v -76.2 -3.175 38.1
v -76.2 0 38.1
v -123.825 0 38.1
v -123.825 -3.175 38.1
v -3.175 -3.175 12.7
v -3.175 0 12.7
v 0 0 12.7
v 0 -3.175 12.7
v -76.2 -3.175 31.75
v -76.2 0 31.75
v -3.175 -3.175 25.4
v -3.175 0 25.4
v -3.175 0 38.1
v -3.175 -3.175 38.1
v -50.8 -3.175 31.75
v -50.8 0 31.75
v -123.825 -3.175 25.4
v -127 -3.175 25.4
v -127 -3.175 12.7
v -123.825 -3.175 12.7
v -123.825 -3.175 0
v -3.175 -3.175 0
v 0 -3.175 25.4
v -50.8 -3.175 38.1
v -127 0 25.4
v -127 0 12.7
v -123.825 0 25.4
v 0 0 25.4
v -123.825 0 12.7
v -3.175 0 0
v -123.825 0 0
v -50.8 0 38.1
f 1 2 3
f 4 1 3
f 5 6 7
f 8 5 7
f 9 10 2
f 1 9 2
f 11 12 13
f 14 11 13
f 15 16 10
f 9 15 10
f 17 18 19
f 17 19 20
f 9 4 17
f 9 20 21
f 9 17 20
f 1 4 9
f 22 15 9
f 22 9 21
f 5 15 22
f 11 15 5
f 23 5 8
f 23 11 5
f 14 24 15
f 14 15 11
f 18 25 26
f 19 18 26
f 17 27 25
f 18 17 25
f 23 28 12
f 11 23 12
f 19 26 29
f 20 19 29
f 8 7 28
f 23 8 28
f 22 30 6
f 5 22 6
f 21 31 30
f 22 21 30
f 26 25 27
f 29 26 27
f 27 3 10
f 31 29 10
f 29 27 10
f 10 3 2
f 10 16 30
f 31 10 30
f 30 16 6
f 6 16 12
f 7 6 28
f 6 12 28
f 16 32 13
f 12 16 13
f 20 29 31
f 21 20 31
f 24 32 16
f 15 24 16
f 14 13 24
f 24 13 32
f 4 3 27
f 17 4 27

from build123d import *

# Parameters (mm, degrees)
F1_DEPTH = 3.175


with BuildPart() as f1:
    # F0 (on Front) → F1 (new body)
    with BuildSketch(Plane.XZ):
        Polygon((-123.825, 0), (-63.5, 0), (-63.5, 31.75), (-76.2, 31.75), (-76.2, 38.1), (-123.825, 38.1), (-123.825, 25.4), (-127, 25.4), (-127, 12.7), (-123.825, 12.7), align=None)
        Polygon((-63.5, 0), (-3.175, 0), (-3.175, 12.7), (0, 12.7), (0, 25.4), (-3.175, 25.4), (-3.175, 38.1), (-50.8, 38.1), (-50.8, 31.75), (-63.5, 31.75), align=None)
    extrude(amount=F1_DEPTH)


solid = f1.part
